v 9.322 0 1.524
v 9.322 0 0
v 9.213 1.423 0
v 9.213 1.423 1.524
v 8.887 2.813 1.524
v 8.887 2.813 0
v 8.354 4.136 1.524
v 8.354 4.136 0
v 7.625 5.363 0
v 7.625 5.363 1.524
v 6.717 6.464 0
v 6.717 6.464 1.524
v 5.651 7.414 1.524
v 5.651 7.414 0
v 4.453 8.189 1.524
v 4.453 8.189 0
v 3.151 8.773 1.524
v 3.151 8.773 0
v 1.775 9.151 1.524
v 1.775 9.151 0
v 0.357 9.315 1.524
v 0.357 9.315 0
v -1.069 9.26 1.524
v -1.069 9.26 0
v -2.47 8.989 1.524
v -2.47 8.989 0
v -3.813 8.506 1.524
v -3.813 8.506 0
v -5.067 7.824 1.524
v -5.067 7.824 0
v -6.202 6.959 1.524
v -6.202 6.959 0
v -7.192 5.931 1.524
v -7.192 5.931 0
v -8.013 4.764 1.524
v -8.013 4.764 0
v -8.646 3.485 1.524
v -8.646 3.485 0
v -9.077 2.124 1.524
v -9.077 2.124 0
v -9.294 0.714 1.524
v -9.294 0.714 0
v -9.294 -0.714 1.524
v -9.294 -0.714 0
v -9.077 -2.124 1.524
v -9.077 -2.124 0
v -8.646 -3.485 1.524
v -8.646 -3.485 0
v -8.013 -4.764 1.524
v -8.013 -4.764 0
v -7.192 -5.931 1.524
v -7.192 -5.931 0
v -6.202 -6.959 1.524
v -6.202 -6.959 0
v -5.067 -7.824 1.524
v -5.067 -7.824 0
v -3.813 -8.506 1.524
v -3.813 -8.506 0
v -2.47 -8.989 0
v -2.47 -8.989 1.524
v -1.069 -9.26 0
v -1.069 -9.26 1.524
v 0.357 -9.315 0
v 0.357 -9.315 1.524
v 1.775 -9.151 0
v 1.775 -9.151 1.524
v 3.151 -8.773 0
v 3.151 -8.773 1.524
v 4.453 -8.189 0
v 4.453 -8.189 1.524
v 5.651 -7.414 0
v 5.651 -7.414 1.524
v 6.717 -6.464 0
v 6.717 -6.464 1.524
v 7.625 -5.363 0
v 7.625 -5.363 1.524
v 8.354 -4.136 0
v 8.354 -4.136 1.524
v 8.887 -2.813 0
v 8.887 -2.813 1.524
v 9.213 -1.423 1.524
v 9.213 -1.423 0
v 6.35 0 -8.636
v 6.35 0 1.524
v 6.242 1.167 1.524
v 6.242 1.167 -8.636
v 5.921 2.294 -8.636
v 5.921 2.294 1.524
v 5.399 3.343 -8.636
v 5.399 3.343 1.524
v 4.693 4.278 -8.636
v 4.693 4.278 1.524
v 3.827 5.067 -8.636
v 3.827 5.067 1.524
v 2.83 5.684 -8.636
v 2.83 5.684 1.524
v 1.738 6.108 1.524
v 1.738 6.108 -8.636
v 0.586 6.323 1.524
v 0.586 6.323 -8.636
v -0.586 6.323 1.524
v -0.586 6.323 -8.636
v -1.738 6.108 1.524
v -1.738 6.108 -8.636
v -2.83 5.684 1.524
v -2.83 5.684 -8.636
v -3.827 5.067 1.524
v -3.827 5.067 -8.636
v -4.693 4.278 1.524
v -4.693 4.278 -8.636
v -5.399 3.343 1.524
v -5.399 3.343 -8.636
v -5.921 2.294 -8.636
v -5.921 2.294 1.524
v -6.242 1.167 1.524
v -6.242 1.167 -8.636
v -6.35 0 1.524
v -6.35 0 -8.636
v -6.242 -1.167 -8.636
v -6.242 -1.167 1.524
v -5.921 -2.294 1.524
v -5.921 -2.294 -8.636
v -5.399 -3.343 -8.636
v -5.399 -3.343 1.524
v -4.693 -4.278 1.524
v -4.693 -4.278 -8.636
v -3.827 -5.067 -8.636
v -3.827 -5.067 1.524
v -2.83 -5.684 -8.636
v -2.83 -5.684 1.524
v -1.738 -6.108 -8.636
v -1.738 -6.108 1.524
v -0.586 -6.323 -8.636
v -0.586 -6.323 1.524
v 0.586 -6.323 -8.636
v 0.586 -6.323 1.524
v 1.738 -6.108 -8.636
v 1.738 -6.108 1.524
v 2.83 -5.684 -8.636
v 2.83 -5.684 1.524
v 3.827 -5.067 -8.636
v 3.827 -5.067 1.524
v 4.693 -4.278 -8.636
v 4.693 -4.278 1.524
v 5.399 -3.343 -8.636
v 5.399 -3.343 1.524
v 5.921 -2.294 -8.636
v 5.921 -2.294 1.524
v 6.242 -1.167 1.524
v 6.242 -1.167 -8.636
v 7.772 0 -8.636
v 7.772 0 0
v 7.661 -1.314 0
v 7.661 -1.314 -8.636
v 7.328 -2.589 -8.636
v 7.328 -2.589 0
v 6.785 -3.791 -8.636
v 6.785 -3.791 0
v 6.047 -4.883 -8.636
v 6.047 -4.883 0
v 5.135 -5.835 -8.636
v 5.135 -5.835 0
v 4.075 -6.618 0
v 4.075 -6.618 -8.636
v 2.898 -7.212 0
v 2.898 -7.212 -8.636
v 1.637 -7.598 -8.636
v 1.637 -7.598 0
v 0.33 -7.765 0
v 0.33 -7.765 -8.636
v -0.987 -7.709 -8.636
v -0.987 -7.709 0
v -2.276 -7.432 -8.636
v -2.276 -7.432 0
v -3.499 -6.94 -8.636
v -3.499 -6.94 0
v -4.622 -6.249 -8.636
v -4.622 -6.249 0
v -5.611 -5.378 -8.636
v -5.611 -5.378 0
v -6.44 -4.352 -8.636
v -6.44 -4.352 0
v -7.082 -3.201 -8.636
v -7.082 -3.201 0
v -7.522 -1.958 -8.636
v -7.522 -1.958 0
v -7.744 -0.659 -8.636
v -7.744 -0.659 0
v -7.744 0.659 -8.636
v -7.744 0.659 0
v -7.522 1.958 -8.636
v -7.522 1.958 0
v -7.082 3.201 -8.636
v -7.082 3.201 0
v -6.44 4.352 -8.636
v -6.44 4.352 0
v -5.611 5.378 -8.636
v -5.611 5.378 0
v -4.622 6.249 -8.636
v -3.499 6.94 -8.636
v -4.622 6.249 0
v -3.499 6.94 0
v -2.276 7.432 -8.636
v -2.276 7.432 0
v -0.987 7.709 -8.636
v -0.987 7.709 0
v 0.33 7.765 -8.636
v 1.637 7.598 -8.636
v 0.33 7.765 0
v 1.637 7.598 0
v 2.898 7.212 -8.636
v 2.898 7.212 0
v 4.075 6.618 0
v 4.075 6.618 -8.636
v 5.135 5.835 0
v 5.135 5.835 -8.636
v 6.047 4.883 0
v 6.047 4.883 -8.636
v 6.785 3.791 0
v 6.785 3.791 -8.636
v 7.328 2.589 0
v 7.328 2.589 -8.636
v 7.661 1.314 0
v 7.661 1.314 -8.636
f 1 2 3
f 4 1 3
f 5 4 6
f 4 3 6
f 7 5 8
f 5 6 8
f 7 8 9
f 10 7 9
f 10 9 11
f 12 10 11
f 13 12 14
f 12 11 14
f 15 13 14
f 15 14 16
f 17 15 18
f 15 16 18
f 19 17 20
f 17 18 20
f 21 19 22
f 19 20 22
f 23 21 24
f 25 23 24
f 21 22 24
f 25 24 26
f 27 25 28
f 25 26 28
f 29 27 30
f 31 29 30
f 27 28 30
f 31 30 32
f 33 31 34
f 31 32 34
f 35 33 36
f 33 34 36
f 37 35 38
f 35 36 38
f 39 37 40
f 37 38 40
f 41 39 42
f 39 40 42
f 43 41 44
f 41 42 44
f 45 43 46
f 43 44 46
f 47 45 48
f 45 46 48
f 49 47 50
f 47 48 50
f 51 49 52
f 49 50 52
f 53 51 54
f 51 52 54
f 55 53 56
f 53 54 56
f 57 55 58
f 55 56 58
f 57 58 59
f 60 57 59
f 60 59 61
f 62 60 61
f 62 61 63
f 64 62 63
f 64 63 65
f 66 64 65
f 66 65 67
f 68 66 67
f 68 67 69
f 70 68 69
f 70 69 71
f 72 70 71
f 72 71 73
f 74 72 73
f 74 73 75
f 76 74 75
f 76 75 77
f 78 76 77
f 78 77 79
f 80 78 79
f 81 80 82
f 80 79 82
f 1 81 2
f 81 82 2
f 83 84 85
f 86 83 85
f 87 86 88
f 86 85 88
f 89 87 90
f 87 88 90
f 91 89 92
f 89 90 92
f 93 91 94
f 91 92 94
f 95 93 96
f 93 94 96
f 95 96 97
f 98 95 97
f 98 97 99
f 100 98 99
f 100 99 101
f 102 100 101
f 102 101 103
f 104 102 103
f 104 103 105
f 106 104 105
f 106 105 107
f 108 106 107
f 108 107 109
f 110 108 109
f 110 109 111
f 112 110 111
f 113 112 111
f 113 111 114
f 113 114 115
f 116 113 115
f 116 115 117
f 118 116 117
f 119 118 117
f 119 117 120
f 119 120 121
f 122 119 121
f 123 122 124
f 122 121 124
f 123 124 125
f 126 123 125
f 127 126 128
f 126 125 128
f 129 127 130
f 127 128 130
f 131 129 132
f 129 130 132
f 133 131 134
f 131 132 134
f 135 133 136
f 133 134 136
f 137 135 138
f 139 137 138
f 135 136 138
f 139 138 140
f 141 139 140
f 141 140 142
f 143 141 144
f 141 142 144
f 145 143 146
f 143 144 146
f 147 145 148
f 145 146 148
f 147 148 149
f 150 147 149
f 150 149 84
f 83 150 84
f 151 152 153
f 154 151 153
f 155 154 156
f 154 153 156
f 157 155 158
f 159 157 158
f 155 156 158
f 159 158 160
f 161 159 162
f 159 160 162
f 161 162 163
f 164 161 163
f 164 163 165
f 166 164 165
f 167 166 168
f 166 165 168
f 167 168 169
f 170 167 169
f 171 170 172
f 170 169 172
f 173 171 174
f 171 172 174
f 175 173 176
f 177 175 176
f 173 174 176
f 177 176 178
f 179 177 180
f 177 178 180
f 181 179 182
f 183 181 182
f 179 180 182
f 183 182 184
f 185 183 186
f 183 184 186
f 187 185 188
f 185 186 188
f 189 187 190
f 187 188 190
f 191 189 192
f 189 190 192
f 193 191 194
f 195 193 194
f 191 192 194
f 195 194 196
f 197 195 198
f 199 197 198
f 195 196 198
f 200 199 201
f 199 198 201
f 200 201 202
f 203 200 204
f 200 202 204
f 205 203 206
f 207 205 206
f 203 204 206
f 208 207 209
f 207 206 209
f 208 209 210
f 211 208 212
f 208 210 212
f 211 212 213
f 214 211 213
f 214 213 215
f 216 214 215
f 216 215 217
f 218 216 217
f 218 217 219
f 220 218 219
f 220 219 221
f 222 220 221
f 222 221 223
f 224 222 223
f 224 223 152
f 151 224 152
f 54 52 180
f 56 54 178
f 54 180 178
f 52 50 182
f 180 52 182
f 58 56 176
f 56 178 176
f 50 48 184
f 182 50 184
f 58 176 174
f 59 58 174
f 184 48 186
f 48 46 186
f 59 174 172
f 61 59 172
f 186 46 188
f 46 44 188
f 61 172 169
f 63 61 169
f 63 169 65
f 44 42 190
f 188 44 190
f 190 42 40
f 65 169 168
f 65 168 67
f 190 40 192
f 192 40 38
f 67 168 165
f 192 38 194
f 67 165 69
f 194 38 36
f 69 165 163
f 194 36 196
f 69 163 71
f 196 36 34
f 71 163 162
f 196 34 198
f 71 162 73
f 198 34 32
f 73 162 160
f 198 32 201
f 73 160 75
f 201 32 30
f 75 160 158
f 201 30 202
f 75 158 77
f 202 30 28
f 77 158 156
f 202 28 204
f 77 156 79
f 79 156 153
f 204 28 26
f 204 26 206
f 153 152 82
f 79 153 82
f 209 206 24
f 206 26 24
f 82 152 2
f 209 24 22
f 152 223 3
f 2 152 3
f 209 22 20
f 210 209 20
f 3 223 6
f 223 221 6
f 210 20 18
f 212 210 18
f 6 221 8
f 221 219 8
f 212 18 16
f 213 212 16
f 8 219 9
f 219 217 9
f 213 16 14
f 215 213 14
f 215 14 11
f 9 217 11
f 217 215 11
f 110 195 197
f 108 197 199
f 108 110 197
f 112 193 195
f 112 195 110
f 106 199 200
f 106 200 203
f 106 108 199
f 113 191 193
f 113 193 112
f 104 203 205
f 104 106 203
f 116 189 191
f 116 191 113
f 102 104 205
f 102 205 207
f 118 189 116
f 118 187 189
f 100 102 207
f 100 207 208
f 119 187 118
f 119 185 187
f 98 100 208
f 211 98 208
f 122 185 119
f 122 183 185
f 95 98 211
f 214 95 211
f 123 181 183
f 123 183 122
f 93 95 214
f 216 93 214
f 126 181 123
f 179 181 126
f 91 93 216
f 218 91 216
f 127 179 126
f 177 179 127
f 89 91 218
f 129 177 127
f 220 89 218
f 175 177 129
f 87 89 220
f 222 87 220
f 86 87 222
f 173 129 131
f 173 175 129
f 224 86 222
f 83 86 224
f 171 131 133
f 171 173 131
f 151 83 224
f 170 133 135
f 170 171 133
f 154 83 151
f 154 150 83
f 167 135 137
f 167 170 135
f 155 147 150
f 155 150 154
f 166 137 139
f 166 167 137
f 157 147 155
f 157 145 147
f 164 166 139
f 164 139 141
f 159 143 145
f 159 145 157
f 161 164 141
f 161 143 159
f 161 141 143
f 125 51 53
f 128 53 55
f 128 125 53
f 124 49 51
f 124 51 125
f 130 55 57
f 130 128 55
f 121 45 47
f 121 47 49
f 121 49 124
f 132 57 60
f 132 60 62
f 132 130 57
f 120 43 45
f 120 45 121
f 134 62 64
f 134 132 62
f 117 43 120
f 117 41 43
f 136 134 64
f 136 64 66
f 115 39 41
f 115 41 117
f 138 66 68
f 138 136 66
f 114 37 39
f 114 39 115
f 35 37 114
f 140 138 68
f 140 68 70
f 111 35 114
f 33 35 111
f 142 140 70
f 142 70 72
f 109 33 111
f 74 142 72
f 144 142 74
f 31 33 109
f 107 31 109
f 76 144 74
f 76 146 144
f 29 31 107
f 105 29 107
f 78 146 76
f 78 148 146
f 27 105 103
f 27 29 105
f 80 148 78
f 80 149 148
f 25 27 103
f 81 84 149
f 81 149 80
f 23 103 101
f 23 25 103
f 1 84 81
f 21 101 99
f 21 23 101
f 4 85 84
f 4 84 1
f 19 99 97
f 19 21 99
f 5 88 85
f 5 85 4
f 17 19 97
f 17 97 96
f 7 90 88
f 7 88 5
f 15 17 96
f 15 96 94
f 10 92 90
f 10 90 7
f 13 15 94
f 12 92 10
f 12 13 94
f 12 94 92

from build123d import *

# Parameters (mm, degrees)
F0_R     = 9.3218
F1_DEPTH = 1.524
F2_R     = 7.7724
F3_DEPTH = 8.636
F4_R     = 6.35
F5_DEPTH = 10.161


with BuildPart() as f1:
    # F0 (on Top) → F1 (new body)
    with BuildSketch(Plane.XY):
        Circle(F0_R)
    extrude(amount=F1_DEPTH)

    # F2 (on face) → F3 (join)
    with BuildSketch(Plane(origin=(0, 0, 0), x_dir=(1, 0, 0), z_dir=(0, 0, -1))):
        Circle(F2_R)
    extrude(amount=F3_DEPTH)

    # F4 (on face) → F5 (cut, through all)
    with BuildSketch(Plane.XY.offset(1.524)):
        Circle(F4_R)
    extrude(amount=-F5_DEPTH, mode=Mode.SUBTRACT)


solid = f1.part
